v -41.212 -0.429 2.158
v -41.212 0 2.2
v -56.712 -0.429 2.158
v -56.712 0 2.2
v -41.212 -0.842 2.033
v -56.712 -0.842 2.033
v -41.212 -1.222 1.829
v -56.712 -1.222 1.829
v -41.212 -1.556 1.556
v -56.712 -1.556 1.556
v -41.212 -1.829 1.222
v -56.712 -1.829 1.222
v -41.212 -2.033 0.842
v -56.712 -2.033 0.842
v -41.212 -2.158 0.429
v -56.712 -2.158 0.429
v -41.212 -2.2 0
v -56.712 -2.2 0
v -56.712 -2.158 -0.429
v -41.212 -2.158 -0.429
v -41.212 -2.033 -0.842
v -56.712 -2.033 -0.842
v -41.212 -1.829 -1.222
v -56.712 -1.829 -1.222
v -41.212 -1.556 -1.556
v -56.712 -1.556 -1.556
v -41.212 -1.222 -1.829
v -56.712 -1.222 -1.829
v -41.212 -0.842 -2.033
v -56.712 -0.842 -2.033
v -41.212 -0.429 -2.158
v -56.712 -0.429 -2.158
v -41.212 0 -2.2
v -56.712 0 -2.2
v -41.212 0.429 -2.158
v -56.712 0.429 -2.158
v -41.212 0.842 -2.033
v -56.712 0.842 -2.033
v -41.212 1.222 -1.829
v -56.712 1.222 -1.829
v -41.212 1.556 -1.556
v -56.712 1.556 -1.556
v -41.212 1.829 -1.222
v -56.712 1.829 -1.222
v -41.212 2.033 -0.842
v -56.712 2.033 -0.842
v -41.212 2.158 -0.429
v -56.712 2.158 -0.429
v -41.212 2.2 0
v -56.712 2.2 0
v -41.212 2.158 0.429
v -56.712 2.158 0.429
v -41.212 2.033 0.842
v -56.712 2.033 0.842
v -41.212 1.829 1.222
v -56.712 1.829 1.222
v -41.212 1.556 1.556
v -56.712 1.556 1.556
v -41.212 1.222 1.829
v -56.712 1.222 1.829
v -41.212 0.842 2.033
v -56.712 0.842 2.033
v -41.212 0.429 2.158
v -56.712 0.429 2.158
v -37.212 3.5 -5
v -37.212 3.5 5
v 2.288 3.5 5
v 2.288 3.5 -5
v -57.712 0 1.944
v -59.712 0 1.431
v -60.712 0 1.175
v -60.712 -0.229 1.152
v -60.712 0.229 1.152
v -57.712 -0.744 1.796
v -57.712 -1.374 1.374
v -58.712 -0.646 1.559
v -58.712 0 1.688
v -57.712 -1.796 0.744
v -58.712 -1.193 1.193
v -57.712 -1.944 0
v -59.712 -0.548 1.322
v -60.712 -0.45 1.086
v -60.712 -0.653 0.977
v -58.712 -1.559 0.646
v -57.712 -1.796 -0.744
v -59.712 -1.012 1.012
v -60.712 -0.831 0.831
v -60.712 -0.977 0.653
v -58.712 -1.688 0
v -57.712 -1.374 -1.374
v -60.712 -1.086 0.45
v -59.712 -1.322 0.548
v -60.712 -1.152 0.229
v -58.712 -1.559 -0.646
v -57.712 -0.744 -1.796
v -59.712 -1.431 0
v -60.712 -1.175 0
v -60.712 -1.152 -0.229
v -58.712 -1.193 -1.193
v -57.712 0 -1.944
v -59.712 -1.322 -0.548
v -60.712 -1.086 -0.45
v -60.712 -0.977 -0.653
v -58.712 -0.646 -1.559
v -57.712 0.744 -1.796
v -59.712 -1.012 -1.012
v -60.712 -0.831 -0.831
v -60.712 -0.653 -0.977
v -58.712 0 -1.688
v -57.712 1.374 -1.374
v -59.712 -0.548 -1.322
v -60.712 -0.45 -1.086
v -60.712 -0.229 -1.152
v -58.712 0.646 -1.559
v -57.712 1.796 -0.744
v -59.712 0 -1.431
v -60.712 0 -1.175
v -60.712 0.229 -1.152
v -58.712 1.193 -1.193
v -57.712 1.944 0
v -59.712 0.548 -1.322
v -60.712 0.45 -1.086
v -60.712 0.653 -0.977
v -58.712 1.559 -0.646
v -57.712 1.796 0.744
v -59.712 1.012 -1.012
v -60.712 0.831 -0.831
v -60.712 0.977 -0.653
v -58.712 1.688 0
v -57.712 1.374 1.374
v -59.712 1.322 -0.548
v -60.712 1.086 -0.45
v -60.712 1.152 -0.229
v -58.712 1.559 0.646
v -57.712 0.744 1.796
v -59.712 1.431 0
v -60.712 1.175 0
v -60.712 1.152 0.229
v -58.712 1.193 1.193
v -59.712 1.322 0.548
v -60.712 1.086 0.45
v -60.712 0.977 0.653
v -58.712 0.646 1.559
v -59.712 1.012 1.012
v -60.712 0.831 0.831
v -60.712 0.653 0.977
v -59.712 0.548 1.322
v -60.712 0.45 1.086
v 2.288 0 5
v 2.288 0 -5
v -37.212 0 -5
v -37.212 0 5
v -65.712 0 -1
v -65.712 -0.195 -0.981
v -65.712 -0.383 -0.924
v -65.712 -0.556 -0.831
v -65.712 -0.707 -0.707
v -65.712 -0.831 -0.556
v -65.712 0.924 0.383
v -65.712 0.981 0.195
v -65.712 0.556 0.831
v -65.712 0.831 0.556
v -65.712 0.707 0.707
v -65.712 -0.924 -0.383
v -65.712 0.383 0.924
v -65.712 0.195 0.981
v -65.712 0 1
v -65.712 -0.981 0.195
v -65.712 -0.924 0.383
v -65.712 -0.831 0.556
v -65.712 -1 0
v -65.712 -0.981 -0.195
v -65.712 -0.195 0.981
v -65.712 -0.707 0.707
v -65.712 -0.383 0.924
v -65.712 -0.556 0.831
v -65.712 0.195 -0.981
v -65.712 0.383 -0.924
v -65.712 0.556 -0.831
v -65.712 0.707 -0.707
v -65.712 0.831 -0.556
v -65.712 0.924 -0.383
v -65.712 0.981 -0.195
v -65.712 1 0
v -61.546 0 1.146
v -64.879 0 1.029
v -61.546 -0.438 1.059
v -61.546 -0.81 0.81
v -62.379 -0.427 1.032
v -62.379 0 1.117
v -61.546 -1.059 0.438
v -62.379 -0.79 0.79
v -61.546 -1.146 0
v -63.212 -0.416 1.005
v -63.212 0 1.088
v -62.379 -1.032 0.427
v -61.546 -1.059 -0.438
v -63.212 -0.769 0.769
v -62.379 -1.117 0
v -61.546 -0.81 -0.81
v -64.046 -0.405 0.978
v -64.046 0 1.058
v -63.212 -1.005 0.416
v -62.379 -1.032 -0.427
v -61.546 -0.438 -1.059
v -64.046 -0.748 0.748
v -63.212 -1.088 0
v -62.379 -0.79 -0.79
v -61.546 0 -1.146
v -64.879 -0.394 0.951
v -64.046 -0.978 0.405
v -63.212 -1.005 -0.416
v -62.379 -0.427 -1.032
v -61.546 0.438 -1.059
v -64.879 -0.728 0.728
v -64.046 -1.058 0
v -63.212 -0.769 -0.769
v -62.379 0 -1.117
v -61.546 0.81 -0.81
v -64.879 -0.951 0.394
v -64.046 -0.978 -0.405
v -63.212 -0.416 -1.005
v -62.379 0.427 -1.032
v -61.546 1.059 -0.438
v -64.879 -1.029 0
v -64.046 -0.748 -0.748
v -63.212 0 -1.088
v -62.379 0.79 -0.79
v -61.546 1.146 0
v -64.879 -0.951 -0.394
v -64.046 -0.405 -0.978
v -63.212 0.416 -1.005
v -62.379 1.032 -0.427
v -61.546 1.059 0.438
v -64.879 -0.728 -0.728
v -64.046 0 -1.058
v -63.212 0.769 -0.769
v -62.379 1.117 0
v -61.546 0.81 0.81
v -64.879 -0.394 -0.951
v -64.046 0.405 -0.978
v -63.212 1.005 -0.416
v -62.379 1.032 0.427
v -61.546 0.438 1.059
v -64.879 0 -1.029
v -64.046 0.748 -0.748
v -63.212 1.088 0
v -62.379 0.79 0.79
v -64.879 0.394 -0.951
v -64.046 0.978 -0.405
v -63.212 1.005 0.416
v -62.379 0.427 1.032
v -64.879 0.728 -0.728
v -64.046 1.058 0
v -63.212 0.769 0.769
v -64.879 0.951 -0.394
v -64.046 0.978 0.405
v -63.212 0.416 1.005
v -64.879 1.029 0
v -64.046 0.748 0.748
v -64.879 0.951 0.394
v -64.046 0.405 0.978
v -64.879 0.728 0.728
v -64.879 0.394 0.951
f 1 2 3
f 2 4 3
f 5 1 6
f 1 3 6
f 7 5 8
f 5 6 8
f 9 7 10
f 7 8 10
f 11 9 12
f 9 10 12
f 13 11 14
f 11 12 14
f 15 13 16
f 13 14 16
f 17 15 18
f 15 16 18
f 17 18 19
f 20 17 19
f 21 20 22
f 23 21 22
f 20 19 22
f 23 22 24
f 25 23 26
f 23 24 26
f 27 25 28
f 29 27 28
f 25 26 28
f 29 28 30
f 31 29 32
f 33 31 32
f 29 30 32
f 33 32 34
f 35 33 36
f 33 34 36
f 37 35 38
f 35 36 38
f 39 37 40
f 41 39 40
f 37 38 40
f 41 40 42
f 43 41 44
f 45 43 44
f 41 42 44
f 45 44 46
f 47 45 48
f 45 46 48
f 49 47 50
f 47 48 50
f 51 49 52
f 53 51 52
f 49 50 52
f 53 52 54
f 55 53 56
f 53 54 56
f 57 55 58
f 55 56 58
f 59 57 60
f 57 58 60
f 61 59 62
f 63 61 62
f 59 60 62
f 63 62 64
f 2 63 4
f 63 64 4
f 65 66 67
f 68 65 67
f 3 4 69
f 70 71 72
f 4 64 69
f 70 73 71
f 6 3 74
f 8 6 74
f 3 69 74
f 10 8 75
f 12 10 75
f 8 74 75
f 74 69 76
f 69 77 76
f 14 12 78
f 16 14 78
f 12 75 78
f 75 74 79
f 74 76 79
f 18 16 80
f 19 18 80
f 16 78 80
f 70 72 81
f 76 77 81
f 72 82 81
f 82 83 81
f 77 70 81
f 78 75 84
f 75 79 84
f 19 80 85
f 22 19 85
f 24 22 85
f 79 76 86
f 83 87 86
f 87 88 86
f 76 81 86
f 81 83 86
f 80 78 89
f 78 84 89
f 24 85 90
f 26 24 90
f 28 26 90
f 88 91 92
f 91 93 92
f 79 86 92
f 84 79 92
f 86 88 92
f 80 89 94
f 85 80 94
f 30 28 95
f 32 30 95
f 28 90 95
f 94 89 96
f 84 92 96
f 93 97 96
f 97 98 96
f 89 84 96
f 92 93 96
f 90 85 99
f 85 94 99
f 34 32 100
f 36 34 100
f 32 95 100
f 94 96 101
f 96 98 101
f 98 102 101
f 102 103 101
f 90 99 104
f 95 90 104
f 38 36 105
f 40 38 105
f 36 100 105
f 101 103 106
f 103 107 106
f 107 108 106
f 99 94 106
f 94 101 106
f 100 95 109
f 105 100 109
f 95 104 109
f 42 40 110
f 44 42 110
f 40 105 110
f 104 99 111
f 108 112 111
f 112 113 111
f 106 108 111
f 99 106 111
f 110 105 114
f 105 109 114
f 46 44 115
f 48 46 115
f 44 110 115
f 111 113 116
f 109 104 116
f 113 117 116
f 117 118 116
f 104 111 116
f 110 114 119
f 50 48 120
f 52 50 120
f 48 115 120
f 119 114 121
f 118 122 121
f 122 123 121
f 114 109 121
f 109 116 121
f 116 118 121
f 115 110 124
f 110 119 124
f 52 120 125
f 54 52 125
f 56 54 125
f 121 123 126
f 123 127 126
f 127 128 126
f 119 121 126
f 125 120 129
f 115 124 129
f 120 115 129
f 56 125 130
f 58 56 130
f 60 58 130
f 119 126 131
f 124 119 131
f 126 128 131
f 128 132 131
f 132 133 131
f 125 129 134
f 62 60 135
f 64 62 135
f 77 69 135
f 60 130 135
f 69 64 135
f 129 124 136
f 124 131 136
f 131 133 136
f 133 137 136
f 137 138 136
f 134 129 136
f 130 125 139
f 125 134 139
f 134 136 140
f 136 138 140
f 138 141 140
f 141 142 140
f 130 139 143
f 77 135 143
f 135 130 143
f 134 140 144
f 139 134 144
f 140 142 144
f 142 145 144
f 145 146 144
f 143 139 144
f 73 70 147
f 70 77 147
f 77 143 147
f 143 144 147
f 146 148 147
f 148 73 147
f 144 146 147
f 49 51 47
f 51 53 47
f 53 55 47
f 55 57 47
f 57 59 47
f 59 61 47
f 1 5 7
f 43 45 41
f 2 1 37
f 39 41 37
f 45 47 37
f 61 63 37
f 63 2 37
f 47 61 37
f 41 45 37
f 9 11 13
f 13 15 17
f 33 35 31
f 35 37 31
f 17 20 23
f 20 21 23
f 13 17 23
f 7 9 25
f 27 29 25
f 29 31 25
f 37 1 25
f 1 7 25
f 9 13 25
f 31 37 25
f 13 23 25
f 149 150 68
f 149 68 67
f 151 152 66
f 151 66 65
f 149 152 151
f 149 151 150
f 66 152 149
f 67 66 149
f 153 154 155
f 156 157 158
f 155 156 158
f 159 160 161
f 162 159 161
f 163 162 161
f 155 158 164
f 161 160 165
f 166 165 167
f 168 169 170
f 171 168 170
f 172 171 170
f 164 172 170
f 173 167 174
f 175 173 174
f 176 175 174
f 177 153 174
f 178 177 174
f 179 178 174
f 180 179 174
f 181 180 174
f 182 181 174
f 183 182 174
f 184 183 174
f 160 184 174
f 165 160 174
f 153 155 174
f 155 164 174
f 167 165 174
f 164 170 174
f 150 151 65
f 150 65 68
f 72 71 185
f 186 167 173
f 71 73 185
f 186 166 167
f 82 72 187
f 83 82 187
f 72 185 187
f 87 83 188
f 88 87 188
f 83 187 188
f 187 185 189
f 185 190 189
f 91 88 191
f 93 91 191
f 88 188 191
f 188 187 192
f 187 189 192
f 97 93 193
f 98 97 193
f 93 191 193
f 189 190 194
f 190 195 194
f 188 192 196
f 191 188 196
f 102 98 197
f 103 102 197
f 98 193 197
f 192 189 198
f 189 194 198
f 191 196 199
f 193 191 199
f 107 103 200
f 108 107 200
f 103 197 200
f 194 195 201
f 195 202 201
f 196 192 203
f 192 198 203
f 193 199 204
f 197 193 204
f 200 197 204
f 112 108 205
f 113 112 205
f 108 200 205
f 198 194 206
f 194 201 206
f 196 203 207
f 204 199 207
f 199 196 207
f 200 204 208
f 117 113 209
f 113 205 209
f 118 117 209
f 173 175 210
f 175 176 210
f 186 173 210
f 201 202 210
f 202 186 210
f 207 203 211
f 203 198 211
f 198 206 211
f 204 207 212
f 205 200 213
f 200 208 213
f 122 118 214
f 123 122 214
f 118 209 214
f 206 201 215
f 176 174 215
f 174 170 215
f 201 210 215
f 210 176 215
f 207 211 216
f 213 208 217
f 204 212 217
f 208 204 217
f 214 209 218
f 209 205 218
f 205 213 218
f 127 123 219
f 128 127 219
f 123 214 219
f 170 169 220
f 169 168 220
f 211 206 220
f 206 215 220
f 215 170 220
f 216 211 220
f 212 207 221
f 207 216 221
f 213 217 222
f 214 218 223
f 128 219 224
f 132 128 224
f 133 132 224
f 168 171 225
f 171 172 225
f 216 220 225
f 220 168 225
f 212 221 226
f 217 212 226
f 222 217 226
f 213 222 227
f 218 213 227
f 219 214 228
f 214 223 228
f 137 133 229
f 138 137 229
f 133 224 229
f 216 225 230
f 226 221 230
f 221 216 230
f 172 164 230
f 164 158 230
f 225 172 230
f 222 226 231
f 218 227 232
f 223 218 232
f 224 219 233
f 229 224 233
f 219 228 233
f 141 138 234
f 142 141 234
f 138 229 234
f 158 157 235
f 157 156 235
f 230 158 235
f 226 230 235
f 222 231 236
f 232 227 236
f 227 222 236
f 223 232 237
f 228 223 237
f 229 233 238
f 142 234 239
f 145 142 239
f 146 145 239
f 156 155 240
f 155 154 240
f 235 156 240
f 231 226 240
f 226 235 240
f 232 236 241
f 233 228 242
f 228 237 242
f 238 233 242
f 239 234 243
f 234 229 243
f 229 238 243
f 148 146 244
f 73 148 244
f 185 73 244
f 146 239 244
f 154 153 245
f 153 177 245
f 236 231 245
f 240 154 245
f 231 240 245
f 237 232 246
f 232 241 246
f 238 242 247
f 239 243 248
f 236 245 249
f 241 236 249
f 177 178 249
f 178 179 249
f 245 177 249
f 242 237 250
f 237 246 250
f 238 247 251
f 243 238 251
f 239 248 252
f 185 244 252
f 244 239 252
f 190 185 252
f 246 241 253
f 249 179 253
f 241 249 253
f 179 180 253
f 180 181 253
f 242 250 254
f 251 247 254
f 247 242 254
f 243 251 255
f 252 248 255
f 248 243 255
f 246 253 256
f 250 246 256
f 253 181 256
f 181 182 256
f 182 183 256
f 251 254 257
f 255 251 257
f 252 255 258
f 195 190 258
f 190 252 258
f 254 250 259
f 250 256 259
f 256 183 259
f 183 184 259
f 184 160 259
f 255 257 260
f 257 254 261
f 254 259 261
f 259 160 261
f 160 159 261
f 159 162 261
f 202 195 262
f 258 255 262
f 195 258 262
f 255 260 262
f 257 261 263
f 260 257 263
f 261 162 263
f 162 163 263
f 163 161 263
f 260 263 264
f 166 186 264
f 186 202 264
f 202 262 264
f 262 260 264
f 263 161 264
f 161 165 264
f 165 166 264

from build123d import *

# Parameters (mm, degrees)
F0_W     = 39.5
F0_H     = 5
F2_DEPTH = 3.5


with BuildPart() as f1:
    # F0 (on Front) → F1 (revolve)
    with BuildSketch(Plane.XZ):
        Polygon((-65.712437, 1), (-65.712437, 0), (-41.212437, 0), (-41.212437, 2.2), (-56.712437, 2.2), (-60.712437, 1.175), align=None)
    revolve(axis=Axis((-53.462437, 0, 0), (1, 0, 0)))


with BuildPart() as f2:
    # F0 (on Front) → F2 (new body)
    with BuildSketch(Plane.XZ):
        with Locations((-17.462437, 2.5)):
            Rectangle(F0_W, F0_H)
        with Locations((-17.462437, -2.5)):
            Rectangle(F0_W, F0_H)
    extrude(amount=-F2_DEPTH)


solid = Compound([f1.part, f2.part])
